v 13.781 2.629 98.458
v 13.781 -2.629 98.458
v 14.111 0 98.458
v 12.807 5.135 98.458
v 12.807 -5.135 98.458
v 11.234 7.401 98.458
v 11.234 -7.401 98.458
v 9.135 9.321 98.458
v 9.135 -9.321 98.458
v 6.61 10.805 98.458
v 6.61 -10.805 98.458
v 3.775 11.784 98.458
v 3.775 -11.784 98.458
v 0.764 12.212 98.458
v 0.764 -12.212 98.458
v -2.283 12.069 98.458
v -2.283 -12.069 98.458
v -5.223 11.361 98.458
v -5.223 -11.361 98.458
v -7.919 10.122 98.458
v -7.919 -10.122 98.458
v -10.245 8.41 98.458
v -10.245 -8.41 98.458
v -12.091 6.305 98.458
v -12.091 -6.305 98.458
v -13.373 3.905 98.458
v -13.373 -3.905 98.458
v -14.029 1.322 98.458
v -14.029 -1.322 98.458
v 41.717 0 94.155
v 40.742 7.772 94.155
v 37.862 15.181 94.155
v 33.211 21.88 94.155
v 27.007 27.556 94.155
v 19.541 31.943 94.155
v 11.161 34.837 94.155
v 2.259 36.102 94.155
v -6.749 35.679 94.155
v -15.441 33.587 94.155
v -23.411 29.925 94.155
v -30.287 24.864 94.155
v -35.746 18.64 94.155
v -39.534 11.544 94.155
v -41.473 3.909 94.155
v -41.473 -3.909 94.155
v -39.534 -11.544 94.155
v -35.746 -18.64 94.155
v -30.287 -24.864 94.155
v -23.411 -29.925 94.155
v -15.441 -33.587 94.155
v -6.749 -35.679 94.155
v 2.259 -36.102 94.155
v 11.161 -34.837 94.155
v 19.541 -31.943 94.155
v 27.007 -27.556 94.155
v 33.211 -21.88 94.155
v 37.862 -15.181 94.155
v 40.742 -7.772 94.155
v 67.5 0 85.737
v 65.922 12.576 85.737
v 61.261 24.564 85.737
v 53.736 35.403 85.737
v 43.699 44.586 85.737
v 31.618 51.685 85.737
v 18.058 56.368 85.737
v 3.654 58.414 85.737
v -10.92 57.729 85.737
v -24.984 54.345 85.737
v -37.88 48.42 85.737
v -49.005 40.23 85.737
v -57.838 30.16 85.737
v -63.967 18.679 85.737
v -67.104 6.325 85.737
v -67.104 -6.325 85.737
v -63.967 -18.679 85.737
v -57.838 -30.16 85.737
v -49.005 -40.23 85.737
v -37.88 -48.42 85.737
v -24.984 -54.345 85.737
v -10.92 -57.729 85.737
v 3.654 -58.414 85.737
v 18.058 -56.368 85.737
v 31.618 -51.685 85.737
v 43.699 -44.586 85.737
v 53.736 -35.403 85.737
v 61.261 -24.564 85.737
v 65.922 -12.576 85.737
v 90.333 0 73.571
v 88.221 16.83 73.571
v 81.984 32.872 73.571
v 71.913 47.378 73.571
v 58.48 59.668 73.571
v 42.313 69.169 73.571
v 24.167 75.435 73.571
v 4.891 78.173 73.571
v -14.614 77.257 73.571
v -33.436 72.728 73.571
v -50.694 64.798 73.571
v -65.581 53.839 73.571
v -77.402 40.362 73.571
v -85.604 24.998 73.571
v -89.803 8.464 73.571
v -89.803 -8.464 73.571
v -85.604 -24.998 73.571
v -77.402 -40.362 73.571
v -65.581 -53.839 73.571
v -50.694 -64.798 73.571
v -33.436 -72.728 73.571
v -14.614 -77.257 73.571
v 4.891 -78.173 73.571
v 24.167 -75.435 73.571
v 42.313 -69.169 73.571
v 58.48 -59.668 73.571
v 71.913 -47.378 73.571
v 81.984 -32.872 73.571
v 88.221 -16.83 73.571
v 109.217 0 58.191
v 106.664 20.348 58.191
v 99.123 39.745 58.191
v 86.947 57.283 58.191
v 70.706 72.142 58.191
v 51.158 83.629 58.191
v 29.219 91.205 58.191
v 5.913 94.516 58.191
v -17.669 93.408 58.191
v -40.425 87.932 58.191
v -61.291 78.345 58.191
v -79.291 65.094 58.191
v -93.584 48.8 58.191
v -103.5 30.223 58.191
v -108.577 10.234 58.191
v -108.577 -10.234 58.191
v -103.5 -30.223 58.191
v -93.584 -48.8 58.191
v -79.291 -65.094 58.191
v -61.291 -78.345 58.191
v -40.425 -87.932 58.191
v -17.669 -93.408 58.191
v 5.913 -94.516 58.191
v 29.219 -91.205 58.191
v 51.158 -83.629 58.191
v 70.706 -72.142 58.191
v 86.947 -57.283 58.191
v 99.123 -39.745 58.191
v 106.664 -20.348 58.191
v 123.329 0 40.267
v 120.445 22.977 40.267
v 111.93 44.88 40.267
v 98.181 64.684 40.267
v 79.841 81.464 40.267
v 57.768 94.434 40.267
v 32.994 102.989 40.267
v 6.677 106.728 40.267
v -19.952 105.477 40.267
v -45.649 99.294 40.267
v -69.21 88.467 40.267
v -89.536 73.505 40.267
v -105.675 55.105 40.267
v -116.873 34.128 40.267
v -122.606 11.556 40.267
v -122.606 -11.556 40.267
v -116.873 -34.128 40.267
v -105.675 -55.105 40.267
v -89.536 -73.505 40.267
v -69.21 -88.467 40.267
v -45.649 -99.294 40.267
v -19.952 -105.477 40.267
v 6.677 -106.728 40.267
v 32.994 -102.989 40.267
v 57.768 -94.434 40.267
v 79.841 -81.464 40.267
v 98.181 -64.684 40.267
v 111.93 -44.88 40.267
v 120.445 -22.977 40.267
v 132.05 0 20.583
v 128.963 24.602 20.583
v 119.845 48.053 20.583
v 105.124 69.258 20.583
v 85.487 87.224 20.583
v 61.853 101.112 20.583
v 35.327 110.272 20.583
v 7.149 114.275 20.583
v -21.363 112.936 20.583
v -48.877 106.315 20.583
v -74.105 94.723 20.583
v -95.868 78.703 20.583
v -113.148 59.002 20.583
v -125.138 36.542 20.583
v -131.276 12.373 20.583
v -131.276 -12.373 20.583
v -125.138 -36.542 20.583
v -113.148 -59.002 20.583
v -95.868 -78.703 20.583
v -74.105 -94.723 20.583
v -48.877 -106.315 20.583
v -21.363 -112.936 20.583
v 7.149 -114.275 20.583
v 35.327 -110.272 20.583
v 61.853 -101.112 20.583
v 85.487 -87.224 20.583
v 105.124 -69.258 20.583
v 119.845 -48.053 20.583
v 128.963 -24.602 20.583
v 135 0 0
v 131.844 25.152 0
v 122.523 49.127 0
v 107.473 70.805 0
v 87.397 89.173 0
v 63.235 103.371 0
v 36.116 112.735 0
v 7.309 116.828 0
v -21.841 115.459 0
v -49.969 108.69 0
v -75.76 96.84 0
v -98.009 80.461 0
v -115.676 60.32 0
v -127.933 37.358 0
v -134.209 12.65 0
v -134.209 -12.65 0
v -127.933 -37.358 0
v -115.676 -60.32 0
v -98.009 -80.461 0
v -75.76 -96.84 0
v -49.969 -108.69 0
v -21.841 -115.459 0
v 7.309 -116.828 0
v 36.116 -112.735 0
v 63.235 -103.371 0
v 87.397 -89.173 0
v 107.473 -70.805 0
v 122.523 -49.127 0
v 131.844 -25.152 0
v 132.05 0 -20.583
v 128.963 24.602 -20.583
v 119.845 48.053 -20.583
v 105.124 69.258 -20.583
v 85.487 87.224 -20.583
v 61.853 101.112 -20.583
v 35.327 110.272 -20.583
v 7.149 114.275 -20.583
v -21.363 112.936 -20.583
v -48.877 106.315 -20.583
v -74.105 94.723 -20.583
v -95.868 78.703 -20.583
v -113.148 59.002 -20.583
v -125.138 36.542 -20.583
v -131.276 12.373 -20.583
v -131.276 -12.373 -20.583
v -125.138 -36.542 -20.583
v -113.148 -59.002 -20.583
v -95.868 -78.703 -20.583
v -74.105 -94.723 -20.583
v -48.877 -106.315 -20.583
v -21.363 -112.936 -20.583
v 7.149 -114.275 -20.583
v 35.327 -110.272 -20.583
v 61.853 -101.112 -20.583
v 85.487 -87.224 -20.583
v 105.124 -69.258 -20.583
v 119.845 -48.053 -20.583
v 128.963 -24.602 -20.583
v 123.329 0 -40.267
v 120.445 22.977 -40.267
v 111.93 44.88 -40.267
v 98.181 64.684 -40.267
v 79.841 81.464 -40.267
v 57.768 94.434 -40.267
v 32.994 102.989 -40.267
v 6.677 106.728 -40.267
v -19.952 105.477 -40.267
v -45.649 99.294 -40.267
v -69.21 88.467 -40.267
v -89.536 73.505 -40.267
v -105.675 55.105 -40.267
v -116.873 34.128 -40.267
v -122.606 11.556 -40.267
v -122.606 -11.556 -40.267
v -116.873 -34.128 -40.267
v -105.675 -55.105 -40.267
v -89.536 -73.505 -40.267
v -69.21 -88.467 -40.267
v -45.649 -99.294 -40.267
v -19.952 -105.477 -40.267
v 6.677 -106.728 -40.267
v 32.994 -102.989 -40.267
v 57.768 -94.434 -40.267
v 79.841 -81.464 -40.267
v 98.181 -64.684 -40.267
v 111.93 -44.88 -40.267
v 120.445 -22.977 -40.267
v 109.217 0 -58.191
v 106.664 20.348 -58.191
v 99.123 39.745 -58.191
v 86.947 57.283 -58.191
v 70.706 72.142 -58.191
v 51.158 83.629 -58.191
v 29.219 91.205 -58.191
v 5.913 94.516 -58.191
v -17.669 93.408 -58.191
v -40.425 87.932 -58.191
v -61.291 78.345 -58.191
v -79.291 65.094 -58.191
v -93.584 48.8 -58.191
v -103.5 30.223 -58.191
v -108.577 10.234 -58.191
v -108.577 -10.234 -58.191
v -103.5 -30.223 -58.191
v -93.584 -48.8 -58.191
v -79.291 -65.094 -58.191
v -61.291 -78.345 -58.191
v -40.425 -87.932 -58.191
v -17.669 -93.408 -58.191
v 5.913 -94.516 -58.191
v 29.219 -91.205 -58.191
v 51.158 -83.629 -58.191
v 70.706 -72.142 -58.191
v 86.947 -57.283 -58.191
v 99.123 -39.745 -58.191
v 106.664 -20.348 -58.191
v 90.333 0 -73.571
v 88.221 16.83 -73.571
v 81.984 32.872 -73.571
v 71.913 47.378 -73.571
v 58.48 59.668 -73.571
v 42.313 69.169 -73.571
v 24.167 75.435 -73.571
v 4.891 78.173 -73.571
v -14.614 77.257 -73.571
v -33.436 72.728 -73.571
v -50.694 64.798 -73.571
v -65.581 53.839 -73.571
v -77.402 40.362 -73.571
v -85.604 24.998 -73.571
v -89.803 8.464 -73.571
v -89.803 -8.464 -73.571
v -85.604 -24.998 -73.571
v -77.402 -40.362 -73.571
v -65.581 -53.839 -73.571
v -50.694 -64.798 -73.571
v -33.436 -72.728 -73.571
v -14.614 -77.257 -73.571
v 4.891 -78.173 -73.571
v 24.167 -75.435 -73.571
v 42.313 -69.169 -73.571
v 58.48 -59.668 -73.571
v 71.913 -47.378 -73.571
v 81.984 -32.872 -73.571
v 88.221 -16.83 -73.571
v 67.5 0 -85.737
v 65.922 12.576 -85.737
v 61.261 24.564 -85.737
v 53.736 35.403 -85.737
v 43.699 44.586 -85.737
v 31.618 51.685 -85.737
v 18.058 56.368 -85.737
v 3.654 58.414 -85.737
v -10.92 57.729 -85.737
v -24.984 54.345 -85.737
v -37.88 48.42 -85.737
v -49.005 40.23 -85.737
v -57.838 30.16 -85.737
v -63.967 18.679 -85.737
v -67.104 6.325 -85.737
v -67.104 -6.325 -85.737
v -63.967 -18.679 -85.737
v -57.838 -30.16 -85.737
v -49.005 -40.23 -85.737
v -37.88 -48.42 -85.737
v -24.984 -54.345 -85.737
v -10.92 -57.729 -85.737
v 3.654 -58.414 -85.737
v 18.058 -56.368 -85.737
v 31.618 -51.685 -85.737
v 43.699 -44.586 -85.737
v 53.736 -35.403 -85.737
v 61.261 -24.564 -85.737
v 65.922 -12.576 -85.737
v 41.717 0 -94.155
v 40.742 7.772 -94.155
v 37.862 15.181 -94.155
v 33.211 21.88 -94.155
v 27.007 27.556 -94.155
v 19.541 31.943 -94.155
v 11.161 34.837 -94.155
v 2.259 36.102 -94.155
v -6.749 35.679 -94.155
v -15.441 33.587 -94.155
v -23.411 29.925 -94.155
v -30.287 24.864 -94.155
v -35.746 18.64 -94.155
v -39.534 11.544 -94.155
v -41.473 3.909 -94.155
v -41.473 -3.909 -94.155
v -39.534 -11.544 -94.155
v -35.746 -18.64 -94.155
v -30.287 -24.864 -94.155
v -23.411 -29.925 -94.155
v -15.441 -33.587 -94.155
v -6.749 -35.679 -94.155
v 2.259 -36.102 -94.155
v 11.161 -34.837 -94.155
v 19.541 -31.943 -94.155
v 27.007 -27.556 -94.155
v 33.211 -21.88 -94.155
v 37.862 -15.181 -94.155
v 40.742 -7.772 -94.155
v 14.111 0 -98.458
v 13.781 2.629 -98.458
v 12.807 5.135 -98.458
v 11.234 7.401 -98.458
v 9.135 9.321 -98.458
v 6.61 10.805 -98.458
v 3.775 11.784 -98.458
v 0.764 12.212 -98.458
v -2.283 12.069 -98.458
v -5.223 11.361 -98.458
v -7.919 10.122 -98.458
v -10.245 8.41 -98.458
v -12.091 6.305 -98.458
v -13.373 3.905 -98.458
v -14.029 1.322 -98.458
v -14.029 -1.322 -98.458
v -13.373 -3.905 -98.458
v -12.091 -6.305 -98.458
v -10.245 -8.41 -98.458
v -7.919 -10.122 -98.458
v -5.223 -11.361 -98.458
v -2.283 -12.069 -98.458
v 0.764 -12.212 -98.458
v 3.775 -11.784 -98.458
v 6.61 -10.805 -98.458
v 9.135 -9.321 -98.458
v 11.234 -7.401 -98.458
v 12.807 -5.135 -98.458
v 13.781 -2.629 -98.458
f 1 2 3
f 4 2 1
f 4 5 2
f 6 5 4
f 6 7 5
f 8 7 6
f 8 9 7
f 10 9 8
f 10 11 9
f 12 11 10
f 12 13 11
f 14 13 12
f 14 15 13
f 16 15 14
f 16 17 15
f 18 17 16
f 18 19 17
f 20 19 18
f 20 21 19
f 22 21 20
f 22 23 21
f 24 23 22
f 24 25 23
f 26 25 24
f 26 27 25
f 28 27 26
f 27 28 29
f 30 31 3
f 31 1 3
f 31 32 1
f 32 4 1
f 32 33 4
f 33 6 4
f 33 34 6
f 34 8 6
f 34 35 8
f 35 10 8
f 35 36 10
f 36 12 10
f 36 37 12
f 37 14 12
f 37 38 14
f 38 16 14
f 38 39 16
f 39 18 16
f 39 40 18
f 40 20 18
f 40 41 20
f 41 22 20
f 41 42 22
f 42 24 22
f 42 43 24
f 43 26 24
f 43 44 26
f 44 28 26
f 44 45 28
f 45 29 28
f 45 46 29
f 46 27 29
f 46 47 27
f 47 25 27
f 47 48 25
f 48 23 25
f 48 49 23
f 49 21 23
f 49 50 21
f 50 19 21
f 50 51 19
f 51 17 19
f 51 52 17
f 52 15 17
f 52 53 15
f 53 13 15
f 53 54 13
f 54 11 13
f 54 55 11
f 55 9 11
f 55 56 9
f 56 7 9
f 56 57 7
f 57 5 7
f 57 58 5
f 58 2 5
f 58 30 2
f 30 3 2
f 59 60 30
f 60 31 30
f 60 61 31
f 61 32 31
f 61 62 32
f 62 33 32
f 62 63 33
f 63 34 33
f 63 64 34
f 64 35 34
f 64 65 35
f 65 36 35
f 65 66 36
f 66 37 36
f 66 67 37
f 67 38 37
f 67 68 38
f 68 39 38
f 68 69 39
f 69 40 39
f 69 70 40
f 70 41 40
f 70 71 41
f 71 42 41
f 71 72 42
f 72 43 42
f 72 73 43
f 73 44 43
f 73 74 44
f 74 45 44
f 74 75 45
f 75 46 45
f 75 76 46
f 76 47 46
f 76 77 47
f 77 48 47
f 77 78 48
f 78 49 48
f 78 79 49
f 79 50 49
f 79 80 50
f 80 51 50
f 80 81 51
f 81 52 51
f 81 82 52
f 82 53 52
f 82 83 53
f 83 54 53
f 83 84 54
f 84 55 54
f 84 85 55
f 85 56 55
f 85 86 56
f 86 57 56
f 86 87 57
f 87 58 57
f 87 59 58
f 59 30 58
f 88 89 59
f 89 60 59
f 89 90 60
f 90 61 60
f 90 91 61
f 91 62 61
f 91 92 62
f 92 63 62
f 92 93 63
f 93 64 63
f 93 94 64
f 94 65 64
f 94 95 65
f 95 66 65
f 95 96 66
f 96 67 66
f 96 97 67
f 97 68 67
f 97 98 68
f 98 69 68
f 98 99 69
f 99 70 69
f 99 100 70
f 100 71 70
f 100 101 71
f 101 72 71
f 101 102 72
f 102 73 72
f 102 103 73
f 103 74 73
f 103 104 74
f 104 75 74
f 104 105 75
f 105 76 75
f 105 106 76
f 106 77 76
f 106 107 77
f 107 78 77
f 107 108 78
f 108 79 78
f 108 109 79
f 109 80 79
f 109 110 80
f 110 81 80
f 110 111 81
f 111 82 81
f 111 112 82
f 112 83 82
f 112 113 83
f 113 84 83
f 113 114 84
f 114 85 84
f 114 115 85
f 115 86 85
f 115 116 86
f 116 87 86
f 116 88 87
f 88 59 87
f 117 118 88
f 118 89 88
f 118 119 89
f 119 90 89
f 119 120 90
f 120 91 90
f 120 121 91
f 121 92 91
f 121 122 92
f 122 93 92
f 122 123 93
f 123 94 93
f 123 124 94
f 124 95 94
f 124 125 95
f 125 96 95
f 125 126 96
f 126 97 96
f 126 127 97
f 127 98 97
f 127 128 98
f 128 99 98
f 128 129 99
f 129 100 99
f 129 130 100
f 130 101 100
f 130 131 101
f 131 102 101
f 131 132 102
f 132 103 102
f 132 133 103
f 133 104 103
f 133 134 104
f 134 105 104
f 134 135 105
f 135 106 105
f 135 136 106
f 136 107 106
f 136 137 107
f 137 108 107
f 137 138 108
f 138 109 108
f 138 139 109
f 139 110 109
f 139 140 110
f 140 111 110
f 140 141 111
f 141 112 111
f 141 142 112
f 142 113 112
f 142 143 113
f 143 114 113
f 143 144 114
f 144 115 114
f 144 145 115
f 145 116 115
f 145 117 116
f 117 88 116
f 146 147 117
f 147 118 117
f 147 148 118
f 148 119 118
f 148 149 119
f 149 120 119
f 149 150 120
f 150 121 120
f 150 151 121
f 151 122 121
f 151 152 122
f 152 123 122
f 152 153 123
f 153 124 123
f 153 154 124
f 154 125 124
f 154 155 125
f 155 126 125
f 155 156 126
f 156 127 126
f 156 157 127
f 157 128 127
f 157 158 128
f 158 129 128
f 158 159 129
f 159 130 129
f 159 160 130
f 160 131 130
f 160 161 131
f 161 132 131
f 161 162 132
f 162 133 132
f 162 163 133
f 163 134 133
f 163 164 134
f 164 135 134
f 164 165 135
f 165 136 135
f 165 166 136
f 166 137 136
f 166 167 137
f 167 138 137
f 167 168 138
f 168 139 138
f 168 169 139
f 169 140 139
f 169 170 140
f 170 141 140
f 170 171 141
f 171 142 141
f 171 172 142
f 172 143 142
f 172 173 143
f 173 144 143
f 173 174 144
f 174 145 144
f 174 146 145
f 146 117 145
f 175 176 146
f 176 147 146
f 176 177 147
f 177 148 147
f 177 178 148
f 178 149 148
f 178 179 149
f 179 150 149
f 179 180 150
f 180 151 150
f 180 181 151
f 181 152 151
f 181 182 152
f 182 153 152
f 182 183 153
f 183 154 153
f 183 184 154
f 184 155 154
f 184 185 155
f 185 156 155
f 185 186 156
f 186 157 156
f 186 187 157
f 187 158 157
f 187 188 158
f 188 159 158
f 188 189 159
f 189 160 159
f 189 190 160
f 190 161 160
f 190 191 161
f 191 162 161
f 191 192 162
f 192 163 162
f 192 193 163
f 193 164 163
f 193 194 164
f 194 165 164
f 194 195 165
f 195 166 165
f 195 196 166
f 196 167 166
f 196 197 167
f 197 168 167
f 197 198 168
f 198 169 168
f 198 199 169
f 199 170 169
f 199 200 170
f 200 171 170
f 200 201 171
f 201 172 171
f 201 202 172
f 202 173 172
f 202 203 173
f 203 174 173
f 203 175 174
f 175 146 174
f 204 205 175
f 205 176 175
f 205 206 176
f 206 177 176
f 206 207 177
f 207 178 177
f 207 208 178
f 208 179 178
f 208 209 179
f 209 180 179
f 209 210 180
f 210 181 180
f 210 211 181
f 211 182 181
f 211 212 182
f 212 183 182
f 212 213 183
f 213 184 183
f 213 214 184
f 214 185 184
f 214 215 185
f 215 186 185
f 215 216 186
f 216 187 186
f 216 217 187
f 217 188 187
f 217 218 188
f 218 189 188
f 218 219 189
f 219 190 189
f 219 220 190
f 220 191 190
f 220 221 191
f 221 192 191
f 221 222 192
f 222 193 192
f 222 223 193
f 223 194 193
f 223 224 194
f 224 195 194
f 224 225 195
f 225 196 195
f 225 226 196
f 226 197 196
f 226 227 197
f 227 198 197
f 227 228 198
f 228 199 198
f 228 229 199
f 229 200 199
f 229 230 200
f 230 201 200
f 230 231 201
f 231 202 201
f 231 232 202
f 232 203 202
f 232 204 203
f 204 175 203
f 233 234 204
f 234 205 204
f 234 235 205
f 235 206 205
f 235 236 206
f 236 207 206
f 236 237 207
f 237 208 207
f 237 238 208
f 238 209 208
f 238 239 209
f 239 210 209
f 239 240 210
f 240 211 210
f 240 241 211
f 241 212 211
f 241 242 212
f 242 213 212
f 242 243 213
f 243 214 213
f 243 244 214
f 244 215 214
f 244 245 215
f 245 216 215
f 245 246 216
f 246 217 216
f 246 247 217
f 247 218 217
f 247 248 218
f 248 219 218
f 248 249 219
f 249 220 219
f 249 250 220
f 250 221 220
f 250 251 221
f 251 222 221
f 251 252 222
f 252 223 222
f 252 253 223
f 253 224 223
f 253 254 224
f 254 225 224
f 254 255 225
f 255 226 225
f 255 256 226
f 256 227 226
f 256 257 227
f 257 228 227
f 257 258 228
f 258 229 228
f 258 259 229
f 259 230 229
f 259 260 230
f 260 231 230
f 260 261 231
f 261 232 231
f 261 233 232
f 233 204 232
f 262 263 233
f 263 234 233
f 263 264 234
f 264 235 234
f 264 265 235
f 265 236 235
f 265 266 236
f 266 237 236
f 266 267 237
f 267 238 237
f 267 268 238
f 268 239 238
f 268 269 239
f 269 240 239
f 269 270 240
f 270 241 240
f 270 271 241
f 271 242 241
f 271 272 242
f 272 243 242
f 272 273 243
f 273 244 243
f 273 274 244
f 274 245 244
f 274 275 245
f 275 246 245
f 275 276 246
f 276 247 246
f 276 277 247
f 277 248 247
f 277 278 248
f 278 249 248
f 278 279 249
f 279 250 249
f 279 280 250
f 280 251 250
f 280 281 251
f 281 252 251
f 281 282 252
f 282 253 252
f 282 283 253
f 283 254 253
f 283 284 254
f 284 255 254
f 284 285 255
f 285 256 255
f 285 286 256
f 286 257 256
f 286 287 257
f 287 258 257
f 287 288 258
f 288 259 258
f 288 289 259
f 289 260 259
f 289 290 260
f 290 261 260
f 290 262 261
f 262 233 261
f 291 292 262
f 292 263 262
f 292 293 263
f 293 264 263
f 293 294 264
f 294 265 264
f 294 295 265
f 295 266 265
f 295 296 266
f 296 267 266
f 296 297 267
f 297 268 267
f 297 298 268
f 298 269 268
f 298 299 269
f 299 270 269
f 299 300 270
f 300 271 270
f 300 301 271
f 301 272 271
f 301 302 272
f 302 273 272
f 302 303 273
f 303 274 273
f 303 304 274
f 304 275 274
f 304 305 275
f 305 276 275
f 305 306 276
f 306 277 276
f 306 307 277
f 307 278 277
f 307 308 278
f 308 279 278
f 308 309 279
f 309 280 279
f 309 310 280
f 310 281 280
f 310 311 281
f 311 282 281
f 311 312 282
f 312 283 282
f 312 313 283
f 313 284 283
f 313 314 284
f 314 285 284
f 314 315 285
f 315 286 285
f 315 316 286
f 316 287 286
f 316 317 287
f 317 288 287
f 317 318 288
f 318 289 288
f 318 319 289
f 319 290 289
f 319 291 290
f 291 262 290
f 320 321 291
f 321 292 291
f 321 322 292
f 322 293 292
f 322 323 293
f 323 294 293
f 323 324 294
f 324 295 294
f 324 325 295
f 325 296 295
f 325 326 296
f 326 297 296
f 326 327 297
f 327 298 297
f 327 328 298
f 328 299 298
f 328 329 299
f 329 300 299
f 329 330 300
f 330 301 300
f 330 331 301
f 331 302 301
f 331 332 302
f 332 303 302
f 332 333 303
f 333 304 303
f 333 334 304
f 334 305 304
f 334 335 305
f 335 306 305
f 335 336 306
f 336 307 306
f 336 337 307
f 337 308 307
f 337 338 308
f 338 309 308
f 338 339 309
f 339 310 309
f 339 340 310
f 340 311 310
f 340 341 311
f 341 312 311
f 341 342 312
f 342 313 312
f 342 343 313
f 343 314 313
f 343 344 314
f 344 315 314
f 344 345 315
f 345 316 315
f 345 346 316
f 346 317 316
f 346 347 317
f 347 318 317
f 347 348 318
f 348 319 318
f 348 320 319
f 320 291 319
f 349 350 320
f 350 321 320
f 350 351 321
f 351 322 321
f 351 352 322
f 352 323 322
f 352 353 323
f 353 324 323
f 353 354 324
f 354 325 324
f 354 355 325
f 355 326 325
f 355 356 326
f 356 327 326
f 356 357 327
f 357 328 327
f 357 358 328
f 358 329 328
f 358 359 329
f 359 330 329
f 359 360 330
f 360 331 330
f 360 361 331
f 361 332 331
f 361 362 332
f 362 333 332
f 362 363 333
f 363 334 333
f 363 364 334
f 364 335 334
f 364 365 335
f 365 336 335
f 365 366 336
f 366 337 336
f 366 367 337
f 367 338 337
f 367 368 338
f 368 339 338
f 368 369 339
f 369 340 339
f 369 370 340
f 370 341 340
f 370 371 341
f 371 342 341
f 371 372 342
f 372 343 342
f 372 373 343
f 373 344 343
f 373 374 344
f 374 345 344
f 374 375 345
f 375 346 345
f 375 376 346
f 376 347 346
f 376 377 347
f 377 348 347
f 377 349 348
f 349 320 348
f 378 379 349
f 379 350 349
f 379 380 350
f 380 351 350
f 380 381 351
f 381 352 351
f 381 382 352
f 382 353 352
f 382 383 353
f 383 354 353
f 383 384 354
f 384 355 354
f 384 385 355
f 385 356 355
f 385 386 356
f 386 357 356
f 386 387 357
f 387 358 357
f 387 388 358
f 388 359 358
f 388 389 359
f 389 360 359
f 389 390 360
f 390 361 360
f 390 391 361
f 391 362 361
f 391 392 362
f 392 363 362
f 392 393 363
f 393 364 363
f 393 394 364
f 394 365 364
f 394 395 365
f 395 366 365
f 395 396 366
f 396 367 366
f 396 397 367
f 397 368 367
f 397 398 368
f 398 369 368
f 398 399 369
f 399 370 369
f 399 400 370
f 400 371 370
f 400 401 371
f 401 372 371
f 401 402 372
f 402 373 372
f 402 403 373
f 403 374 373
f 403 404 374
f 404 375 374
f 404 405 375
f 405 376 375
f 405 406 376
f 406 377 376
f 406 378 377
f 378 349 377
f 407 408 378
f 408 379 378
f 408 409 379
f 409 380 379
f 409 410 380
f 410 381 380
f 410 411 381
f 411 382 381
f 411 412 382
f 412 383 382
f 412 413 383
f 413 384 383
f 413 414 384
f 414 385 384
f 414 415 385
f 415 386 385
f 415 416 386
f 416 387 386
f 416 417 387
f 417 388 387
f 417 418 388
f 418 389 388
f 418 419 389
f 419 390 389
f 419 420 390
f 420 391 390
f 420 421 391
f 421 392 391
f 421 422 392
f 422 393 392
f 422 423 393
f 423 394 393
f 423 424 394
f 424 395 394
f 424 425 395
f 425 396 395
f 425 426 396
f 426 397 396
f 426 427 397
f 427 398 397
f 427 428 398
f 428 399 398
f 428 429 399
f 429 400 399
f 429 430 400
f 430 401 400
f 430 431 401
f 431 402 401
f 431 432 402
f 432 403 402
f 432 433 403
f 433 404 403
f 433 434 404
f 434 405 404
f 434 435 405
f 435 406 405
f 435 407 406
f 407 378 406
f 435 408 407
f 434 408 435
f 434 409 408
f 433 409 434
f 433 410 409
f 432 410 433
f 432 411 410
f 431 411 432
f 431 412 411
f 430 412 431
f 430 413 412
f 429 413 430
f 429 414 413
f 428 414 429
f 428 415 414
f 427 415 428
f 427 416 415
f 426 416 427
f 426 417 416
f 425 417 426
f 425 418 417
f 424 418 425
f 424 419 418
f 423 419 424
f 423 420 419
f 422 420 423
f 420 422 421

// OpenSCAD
// Generated by SolidPython 1.0.1 on 2020-07-29 00:46:52


scale(v = [15, 13, 11]) {
	sphere(r = 9);
}
/***********************************************
*********      SolidPython code:      **********
************************************************
 
# import packages: SolidPython
from solid import *
from solid.utils import *
from itertools import chain, combinations, permutations


class Resize:

    def __init__(self, scad_file):
        self.scad_file = scad_file
        #self.scad_file = import_scad(scad_file)
        # cone/cylinder param:
        self.r1 = 0
        self.r2 = 0
        self.h = 0
        # rectangular prism param:
        self.w = 0
        self.l = 0
        # ellipse param:
        self.r = 0

    # import OpenScad code (file name corresponds to shape)


    # classify shape + parameters
    def assign(self, param1, param2, param3):
        if self.scad_file == 'cone.scad':
            self.r1 = param1
            self.r2 = param2
            self.h = param3
        elif self.scad_file == 'cylinder.scad':
            self.r1 = param1
            self.r2 = param2
            self.h = param3
        elif self.scad_file == 'rectangularPrism.scad':
            self.h = param1
            self.l = param2
            self.w = param3
        else:
            self.r = param1
            self.h = param2

    # resize parameters
    def iterate(self):
        x = range(3, 20, 2)
        i = 1
        if self.scad_file == 'cone.scad':
            tempList = list(permutations(x, 2))
            for temp in tempList:
                param1 = temp[0]
                param2 = temp[1]
                filepath = 'produced_scad_files/' + 'cone' + str(param1) + '_' + str(param2) + '_' + '.scad'
                scad_render_to_file(cylinder(h=param1, r1=param2, r2=0), filepath)

        elif self.scad_file == 'cylinder.scad':
            tempList = list(permutations(x, 3))
            for temp in tempList:
                param1 = temp[0]
                param2 = temp[1]
                filepath = 'produced_scad_files/' + 'cylinder' + str(param1) + '_' + str(param2) + '_' + '.scad'
                scad_render_to_file(cylinder(h=param1, r1=param2, r2=param2), filepath)

        elif self.scad_file == 'rectangularPrism.scad':
            tempList = list(permutations(x, 3))
            for temp in tempList:
                param1 = temp[0]
                param2 = temp[1]
                param3 = temp[2]
                filepath = 'produced_scad_files/' + 'rectangularPrism' + str(param1) + '_' + str(param2) + '_' + str(
                    param3) + '.scad'
                scad_render_to_file(cube(size=(param1, param2, param3)), filepath)

        elif self.scad_file == 'ellipse.scad':
            tempList = list(permutations(x, 4))
            for temp in tempList:
                param1 = temp[0]
                param2 = temp[1]
                param3 = temp[2]
                param4 = temp[3]
                filepath = 'produced_scad_files/' + 'ellipse' + str(param1) + '_' + str(param2) + '_' + str(param3) + '_' + str(param4) + '.scad'
                scad_render_to_file(scale([param1, param2, param3])(sphere(r=param4)), filepath)

    def render_to_scadfile(self):
        scad_render_to_file(scad, 'example.scad') 
 
************************************************/
